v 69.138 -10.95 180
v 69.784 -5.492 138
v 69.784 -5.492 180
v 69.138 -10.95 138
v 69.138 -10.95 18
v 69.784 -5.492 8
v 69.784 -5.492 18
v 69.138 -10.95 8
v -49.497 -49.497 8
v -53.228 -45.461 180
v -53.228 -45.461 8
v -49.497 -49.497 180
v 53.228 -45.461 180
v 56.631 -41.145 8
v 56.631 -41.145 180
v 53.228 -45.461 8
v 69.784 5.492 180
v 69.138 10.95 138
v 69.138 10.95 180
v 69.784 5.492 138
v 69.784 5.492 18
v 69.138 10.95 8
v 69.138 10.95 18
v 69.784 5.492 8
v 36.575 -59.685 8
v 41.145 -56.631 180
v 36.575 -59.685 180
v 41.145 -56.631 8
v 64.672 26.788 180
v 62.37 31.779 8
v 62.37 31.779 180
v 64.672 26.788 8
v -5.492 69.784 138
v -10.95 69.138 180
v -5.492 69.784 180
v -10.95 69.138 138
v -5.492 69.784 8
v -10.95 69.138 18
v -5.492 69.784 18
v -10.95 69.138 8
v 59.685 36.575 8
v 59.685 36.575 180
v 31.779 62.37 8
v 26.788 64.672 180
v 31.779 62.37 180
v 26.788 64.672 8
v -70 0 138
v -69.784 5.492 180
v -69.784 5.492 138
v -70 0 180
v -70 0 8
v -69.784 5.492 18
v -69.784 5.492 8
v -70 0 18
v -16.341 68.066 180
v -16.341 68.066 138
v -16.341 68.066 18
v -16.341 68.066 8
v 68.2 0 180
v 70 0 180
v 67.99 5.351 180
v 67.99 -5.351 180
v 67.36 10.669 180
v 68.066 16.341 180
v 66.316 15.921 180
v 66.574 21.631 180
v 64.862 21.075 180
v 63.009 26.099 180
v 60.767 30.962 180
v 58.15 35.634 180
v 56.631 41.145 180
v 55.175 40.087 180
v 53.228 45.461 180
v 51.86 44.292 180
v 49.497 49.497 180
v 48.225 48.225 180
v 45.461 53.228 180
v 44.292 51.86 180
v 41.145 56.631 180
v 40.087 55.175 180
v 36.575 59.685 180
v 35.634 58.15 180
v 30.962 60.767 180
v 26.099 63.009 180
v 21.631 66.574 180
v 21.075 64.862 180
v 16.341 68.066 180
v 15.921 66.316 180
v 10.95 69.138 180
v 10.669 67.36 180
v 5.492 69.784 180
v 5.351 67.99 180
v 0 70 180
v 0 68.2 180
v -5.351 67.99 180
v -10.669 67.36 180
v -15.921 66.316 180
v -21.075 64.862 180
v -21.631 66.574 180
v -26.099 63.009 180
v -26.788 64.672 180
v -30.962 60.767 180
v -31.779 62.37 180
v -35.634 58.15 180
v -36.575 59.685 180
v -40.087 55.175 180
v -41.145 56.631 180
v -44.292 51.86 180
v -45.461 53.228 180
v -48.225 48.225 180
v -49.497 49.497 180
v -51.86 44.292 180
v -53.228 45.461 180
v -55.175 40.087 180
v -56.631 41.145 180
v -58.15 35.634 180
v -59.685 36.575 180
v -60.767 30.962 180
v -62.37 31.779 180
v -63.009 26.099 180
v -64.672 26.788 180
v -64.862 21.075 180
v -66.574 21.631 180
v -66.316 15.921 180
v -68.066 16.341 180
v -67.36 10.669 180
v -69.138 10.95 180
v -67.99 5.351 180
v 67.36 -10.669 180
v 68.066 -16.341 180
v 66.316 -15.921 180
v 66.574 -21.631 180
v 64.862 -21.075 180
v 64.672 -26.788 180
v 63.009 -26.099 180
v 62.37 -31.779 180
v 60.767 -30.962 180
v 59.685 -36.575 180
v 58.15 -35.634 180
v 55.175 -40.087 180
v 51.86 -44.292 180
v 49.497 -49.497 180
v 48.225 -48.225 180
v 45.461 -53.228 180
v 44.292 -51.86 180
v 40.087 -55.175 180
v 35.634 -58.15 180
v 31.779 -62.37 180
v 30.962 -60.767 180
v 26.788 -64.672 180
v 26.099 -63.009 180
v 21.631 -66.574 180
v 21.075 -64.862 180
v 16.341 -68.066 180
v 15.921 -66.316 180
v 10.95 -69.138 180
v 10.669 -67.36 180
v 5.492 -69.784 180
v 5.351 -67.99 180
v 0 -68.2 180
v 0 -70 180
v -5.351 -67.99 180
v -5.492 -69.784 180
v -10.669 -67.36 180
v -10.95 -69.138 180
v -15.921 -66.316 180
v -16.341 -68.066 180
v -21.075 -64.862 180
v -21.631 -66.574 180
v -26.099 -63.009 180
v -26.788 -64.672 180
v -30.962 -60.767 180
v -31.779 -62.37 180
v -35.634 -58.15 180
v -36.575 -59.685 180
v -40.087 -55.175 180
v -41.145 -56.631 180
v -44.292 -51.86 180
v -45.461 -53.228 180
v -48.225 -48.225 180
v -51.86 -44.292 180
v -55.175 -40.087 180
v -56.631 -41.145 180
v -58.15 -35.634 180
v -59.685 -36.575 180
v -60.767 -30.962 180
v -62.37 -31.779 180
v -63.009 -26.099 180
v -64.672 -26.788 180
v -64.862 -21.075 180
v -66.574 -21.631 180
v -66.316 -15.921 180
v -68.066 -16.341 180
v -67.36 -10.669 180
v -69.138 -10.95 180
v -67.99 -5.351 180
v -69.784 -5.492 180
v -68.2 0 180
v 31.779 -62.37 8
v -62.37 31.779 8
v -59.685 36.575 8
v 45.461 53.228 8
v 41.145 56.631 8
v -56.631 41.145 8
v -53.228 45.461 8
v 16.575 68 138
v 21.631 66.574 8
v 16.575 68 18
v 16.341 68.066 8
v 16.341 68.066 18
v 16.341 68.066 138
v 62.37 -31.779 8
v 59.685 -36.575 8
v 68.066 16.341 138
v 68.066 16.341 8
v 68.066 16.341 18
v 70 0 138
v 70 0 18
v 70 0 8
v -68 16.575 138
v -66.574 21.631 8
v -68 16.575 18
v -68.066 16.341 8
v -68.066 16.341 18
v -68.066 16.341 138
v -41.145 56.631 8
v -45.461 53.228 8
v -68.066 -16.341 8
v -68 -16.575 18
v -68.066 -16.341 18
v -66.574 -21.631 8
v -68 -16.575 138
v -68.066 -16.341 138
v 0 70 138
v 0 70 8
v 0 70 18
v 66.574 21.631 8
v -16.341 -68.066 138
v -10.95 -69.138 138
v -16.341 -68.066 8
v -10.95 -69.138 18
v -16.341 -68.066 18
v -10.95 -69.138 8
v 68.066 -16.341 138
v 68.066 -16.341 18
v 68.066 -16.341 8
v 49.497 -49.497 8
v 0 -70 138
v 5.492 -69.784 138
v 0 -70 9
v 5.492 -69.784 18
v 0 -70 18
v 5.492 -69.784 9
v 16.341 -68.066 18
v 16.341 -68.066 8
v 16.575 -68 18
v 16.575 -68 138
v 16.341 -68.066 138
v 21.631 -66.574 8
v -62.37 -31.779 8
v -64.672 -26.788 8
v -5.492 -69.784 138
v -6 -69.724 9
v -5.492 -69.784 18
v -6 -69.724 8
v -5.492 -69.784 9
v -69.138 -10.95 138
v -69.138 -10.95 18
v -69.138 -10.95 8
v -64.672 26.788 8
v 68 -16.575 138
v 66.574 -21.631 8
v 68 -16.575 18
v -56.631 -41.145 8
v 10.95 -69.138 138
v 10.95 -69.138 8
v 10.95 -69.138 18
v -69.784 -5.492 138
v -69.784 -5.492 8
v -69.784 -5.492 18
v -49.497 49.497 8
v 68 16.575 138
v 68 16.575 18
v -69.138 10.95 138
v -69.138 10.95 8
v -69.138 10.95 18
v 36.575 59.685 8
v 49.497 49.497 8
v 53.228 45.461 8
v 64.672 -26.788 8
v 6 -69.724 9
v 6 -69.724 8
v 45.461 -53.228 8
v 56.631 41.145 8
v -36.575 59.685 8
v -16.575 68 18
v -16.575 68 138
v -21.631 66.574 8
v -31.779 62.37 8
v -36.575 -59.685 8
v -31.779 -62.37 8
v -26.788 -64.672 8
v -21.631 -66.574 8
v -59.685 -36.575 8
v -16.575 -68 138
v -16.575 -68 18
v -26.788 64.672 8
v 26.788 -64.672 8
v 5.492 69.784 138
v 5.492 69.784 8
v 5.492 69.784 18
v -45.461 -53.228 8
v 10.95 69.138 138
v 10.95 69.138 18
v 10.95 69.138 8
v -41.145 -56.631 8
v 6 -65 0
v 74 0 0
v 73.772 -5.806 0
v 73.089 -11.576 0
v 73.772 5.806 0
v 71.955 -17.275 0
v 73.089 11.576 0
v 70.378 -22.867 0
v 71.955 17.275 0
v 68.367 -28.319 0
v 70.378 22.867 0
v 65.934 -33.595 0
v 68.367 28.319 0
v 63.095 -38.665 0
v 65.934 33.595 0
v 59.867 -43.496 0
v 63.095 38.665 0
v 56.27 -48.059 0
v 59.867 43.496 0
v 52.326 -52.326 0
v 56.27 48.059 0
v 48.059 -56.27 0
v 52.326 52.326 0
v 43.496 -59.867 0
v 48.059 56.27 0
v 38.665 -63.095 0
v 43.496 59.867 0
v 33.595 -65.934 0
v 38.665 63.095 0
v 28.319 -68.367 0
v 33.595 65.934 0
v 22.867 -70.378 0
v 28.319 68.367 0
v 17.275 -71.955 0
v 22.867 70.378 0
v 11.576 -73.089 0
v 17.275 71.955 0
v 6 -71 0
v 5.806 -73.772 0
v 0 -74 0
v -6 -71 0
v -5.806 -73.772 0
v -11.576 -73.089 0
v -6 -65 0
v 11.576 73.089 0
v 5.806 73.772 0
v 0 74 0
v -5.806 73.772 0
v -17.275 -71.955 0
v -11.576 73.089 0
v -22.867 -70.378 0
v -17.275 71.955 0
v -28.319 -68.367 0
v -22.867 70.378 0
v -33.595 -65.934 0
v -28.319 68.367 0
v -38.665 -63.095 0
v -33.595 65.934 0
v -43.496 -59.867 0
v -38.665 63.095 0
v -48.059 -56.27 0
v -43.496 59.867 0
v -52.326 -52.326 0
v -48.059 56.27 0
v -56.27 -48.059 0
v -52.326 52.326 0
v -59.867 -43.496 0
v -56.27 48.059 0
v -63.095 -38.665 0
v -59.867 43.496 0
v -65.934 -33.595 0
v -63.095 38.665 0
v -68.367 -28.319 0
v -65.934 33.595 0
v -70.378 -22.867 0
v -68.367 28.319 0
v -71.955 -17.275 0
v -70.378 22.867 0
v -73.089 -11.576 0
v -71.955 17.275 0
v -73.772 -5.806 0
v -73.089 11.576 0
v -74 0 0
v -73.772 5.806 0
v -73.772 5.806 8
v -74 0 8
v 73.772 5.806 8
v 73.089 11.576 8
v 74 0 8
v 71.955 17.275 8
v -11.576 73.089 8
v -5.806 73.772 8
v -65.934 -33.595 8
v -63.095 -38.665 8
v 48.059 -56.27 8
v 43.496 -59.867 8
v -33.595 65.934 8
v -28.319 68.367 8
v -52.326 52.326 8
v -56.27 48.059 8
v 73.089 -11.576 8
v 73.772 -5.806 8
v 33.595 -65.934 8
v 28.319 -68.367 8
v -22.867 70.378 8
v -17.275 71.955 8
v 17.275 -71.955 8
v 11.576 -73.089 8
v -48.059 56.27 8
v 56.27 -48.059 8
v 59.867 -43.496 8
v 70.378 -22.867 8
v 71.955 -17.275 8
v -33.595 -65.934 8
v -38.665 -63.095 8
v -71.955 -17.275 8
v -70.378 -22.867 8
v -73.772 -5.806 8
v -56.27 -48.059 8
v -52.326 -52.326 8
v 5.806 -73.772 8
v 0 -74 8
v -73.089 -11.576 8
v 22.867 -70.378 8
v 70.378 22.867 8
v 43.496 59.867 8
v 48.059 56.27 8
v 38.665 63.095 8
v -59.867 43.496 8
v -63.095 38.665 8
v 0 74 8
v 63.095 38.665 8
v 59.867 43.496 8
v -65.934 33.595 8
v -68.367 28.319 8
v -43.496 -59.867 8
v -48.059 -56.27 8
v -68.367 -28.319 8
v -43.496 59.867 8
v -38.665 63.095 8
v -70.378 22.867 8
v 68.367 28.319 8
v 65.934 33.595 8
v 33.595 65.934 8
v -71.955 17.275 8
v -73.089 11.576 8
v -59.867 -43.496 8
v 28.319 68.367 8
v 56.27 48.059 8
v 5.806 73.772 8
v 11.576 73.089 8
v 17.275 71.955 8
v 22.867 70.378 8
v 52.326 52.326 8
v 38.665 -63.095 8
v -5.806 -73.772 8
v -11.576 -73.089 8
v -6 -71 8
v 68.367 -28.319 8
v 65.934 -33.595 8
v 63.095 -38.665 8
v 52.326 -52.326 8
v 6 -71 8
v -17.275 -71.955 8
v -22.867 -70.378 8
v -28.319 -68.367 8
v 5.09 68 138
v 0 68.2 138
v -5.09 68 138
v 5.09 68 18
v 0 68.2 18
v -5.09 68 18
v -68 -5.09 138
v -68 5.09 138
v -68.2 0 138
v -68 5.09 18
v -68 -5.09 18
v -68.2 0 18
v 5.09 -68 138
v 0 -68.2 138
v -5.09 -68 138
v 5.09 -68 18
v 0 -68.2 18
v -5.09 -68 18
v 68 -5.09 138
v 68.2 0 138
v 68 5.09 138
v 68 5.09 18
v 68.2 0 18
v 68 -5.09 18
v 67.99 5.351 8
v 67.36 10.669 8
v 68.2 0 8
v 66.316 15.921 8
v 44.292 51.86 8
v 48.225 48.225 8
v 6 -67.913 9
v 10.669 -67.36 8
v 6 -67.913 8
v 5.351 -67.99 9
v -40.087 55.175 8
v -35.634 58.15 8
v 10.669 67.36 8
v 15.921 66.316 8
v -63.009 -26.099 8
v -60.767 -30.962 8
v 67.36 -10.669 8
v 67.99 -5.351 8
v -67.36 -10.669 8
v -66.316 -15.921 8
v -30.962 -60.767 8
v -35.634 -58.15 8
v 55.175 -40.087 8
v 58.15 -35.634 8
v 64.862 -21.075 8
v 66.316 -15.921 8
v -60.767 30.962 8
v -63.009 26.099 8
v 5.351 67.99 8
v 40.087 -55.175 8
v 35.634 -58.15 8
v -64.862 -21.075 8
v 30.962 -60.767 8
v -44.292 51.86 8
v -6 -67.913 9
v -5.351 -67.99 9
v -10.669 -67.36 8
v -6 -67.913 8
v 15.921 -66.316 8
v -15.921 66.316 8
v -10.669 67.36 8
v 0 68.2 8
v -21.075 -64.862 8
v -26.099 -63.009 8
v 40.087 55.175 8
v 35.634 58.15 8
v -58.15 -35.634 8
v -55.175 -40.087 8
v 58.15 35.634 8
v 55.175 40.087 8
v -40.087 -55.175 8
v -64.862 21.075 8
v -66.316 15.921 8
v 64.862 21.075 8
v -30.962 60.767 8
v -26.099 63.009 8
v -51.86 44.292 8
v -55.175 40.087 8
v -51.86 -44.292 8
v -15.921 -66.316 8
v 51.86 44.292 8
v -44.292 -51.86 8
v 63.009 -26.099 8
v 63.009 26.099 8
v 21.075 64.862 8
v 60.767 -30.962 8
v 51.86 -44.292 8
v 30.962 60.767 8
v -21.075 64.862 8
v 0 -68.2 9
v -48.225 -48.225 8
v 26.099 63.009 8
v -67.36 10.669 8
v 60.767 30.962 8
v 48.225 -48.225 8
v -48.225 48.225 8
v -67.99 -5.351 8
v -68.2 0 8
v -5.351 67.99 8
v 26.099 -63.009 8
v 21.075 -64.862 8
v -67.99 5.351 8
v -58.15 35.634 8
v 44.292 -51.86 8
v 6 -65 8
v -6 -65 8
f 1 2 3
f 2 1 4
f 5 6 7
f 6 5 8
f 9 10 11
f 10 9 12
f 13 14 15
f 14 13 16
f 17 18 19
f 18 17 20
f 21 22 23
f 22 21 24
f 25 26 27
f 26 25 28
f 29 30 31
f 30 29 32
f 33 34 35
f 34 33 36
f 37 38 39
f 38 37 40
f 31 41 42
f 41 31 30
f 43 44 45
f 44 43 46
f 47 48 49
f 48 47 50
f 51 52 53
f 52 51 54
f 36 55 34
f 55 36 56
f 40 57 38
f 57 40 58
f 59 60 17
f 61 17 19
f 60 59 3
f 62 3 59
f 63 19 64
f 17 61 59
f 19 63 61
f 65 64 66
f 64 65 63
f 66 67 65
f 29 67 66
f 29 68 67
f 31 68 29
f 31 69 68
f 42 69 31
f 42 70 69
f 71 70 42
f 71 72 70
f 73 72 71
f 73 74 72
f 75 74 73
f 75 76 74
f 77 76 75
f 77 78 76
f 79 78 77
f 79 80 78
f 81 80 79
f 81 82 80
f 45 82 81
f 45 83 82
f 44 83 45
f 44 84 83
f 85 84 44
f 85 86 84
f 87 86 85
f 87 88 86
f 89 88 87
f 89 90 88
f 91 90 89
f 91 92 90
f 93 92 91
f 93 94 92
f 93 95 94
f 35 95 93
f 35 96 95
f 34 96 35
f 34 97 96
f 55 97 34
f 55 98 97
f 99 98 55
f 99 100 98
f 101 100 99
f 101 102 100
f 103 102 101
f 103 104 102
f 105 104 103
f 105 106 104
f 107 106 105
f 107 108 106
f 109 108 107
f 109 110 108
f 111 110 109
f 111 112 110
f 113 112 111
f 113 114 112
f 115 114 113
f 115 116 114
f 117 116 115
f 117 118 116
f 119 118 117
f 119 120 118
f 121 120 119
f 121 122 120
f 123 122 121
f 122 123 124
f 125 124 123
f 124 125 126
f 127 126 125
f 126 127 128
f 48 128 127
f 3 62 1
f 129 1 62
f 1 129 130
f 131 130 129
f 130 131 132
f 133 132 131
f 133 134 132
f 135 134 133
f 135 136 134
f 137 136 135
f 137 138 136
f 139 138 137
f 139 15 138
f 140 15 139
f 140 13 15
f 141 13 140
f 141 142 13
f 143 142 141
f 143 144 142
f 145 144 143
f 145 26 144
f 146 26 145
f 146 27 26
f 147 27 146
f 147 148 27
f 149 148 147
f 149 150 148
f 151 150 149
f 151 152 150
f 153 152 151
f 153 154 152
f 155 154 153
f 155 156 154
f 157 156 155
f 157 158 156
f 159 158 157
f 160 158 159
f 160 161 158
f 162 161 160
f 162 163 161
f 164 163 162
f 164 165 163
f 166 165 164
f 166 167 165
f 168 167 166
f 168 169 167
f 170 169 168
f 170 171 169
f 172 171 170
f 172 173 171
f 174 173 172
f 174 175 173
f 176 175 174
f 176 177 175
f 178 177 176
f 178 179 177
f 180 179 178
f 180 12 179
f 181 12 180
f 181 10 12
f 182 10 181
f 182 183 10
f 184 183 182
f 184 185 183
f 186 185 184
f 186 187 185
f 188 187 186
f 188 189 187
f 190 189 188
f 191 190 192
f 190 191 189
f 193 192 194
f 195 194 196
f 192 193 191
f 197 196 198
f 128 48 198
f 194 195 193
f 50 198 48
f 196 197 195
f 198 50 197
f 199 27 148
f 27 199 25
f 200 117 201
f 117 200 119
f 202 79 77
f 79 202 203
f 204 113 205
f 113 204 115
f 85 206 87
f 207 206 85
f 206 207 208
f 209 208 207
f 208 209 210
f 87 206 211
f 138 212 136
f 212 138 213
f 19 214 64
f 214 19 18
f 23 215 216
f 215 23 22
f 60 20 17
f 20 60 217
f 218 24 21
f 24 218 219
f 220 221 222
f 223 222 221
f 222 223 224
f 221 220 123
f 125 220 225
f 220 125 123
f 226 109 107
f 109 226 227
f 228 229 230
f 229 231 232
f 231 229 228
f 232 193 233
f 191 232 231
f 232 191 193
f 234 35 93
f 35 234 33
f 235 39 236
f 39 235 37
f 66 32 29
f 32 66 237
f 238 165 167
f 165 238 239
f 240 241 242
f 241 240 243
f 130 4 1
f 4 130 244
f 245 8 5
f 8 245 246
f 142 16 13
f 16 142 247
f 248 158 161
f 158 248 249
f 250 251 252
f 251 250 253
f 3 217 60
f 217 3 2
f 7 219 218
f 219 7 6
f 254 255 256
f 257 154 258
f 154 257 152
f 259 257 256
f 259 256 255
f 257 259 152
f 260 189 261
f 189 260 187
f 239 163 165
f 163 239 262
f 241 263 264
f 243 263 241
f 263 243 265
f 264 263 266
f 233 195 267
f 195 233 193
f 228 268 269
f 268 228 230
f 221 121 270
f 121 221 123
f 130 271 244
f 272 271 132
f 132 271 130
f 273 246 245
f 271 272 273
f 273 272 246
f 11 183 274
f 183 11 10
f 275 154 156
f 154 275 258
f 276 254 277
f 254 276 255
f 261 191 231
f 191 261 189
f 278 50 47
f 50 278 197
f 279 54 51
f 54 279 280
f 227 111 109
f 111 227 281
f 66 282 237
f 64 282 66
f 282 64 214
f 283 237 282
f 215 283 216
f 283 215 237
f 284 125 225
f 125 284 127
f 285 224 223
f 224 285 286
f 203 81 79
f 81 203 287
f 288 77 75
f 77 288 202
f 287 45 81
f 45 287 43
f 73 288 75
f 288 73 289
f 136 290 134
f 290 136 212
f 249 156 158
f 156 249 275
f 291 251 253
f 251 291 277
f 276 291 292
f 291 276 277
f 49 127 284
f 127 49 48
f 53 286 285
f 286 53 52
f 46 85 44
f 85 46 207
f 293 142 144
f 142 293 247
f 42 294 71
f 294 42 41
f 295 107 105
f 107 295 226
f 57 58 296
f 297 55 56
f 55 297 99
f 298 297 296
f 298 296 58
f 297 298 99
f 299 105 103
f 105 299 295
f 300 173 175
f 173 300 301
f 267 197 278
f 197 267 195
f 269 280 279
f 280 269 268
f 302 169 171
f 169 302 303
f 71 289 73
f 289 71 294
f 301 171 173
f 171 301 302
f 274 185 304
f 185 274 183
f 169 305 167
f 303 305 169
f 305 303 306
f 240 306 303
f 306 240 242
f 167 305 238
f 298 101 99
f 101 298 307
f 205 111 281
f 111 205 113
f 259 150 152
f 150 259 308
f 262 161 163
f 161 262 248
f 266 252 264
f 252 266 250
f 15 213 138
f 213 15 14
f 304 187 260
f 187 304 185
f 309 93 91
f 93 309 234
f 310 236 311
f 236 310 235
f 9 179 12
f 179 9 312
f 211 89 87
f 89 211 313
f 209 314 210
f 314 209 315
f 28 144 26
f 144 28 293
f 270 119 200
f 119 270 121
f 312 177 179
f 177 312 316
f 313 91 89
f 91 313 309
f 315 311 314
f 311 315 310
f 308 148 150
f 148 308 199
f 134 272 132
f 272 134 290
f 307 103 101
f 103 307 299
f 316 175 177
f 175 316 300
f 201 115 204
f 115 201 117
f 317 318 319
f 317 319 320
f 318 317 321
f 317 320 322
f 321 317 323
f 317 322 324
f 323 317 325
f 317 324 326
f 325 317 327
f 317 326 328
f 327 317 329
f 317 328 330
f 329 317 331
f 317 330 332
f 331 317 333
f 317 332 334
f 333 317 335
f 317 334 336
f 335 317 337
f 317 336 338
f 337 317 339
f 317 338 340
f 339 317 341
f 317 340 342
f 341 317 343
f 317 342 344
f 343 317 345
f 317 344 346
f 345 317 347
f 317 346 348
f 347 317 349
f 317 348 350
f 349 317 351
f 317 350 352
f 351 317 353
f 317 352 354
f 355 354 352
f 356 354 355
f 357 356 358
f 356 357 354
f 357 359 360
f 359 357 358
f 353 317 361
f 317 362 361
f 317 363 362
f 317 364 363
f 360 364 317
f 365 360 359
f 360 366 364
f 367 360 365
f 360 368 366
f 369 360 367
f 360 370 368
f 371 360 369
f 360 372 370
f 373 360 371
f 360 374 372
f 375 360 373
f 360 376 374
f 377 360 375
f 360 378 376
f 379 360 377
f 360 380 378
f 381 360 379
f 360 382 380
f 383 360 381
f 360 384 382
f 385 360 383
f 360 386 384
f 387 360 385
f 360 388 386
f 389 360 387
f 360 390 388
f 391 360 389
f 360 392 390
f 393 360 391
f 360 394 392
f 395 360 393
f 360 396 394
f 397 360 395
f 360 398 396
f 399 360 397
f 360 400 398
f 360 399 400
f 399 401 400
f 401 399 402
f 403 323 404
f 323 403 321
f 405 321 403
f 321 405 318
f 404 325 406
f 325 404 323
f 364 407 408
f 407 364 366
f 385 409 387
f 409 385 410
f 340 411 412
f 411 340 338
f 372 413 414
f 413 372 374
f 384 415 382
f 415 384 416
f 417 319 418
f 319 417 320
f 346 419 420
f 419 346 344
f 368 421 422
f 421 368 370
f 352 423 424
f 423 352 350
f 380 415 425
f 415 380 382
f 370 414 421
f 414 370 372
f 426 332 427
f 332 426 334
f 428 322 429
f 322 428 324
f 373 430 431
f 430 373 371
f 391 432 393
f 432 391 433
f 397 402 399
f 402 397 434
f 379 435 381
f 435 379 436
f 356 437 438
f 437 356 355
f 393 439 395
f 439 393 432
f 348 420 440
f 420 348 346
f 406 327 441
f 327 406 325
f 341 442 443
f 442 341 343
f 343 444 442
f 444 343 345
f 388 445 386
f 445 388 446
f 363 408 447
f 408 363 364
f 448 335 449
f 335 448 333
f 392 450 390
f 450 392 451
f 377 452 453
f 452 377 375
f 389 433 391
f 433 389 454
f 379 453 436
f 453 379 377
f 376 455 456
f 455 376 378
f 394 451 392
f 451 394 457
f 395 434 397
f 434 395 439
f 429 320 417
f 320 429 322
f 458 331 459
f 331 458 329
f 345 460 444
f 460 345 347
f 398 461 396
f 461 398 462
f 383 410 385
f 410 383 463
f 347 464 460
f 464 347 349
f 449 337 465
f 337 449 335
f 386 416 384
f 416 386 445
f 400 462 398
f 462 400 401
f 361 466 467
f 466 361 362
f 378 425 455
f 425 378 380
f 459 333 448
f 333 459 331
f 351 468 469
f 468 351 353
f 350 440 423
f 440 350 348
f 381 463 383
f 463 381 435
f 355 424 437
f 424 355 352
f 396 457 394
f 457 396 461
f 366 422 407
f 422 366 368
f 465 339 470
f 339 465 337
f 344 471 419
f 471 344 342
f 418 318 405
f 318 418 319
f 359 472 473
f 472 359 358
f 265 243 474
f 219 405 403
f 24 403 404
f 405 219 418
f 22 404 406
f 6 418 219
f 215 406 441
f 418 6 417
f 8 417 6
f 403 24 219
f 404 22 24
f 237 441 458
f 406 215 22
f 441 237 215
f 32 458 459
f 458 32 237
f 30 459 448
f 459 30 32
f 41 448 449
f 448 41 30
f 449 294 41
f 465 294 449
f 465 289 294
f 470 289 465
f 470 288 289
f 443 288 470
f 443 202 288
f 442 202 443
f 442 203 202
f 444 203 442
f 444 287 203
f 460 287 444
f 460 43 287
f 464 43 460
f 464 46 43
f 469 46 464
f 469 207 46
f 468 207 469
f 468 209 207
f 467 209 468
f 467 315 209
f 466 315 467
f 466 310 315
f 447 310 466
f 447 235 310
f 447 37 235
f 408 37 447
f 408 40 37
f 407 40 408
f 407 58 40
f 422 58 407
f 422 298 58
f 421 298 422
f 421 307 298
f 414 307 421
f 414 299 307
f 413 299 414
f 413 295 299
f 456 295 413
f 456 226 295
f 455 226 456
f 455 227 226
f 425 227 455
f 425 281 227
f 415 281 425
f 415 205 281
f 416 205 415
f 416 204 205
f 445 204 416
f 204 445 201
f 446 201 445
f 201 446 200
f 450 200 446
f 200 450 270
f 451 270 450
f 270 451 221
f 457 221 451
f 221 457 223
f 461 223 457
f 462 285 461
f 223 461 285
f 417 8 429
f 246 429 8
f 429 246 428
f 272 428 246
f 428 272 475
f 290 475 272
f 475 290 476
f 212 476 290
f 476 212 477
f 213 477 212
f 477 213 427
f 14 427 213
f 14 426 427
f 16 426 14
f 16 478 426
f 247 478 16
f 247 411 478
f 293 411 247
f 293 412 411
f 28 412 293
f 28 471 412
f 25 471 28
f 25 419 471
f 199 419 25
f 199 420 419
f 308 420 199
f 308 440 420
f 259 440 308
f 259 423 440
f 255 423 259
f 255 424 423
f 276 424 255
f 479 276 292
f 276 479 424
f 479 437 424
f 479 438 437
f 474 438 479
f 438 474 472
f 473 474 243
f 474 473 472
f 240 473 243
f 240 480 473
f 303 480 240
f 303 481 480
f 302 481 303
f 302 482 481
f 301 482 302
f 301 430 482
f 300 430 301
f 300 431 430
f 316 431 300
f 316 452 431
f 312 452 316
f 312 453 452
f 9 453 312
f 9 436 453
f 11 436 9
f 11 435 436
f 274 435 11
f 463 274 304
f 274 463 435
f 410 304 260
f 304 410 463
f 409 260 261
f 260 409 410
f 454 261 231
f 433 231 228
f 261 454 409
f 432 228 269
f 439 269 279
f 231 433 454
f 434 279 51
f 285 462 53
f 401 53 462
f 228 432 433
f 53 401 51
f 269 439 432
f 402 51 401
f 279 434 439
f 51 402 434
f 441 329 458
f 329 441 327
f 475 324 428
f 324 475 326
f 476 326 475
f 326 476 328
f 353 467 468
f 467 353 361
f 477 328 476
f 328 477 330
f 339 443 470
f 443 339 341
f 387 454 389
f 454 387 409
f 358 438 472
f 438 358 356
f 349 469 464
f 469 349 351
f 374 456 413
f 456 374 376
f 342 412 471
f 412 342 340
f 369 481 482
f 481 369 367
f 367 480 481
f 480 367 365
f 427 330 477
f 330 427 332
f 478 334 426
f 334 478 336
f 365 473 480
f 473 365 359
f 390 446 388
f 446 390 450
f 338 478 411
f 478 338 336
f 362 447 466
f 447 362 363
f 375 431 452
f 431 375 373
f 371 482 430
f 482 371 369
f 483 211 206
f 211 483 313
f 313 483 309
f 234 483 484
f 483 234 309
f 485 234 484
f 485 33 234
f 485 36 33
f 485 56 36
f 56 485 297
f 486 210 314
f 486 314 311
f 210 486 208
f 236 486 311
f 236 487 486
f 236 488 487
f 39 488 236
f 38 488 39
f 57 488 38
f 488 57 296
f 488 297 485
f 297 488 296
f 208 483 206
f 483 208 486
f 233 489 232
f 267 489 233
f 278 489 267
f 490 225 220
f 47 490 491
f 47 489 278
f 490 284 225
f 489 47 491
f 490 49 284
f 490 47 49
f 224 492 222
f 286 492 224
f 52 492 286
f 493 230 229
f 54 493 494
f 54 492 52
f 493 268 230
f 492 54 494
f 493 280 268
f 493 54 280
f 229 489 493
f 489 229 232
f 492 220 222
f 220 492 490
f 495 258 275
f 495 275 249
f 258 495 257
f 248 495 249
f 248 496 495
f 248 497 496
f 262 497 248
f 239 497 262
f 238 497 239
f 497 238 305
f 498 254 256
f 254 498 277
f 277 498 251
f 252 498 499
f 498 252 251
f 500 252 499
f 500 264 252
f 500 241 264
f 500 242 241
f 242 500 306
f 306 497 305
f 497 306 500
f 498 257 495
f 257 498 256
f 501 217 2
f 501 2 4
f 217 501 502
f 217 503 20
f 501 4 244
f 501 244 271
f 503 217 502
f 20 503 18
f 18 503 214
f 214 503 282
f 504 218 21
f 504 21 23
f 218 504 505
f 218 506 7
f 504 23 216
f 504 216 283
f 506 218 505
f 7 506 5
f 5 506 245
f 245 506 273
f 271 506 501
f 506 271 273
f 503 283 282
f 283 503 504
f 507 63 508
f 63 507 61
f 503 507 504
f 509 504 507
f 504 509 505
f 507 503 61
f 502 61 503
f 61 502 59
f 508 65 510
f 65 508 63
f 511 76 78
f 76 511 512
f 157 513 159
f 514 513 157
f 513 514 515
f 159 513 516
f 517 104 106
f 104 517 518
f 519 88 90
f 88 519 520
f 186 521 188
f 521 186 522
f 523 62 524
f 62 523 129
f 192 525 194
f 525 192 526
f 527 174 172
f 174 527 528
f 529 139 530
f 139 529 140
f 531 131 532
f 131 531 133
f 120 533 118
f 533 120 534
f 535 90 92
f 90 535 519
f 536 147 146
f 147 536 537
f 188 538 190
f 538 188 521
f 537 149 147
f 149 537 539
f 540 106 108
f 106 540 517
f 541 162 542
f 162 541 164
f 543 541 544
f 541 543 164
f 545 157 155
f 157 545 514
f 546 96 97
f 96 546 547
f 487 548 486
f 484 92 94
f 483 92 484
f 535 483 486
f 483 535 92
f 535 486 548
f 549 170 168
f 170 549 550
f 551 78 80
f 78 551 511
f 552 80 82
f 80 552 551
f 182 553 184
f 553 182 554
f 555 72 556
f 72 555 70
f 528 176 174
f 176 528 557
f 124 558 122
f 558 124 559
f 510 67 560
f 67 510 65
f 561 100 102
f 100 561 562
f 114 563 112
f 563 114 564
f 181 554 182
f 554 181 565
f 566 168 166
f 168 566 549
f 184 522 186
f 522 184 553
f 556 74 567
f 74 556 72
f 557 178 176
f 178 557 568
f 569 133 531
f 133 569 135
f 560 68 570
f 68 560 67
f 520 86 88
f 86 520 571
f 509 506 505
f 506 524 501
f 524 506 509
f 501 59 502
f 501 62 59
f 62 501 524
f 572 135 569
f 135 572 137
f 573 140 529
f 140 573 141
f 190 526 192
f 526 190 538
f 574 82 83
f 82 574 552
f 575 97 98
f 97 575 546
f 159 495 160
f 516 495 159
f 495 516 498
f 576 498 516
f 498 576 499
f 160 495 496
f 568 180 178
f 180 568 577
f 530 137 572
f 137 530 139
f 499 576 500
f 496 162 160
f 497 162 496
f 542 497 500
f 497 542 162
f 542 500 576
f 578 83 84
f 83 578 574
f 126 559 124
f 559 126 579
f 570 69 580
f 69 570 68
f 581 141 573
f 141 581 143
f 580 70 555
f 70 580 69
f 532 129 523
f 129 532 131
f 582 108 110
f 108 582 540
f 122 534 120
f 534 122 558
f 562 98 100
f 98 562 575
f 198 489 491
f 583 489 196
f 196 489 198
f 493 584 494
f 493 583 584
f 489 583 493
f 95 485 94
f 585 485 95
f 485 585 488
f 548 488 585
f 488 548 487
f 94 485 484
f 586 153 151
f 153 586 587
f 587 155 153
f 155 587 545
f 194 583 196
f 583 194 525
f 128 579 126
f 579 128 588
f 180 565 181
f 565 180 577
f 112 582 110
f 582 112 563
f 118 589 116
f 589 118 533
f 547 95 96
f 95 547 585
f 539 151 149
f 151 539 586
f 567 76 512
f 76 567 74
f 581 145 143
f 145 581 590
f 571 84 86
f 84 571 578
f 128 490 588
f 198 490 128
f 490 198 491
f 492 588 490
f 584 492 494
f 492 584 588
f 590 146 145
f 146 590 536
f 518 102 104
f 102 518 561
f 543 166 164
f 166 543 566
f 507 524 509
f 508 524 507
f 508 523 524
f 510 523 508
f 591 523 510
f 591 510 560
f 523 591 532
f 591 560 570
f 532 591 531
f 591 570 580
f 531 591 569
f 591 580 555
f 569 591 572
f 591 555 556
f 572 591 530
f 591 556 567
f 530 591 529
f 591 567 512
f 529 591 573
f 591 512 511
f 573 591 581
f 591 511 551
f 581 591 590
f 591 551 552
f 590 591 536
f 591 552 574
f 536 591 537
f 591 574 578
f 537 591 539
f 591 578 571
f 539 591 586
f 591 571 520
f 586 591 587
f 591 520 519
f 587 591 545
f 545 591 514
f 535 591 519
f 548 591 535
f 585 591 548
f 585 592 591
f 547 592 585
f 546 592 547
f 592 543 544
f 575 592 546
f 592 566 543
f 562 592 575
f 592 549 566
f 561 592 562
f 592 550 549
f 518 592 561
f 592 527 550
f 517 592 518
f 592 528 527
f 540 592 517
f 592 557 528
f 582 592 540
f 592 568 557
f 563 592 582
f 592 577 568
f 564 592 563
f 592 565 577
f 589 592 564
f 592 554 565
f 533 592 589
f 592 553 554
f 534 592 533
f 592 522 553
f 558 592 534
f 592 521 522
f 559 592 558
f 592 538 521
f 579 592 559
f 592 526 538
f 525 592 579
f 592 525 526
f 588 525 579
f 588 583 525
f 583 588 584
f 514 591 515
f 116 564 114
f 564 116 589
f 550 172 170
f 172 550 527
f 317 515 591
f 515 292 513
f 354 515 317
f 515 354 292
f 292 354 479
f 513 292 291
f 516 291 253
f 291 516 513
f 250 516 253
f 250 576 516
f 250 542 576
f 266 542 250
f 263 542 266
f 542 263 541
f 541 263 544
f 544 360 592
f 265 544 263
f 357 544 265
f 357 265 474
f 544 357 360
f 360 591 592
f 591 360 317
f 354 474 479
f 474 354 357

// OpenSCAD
// City Skyline Silhouette Lamp — DUAL COLOR
// File 1/2: Lamp cylinder body (Color 1 — translucent PETG)
// File 2/2: city_skyline_cutout.scad (Color 2 — opaque PLA, sits in slots)
// Light source: USB LED strip or tea-light inside
// P2S: 0.15mm, 2 walls, 0% infill — VASE MODE for body
// PETG translucent = light diffuses beautifully

D      = 140;
H      = 180;
WALL_T = 1.8;  // Thin = more light through
BASE_H = 8;
BASE_T = 4;
LID_H  = 12;
CORD_D = 12;   // Power cord slot at base

// Body cylinder (vase mode — print with 1 wall)
difference() {
    union() {
        // Main cylinder
        cylinder(d = D, h = H, $fn = 80);
        // Solid base
        cylinder(d = D + BASE_T*2, h = BASE_H, $fn = 80);
    }
    // Hollow inside
    translate([0, 0, BASE_H])
        cylinder(d = D - WALL_T*2, h = H, $fn = 80);
    // Cord notch at base
    translate([-CORD_D/2, -D/2 - 1, 0])
        cube([CORD_D, BASE_T + 2, BASE_H + 1]);
    // Skyline window slots (receives Color 2 panel)
    // 4 faces, each 80mm wide panel slot, 1.8mm deep
    for (i = [0:3])
        rotate([0, 0, i * 90])
            translate([-40, D/2 - WALL_T - 0.2, BASE_H + 10])
                cube([80, WALL_T + 0.4, 120]);
}
